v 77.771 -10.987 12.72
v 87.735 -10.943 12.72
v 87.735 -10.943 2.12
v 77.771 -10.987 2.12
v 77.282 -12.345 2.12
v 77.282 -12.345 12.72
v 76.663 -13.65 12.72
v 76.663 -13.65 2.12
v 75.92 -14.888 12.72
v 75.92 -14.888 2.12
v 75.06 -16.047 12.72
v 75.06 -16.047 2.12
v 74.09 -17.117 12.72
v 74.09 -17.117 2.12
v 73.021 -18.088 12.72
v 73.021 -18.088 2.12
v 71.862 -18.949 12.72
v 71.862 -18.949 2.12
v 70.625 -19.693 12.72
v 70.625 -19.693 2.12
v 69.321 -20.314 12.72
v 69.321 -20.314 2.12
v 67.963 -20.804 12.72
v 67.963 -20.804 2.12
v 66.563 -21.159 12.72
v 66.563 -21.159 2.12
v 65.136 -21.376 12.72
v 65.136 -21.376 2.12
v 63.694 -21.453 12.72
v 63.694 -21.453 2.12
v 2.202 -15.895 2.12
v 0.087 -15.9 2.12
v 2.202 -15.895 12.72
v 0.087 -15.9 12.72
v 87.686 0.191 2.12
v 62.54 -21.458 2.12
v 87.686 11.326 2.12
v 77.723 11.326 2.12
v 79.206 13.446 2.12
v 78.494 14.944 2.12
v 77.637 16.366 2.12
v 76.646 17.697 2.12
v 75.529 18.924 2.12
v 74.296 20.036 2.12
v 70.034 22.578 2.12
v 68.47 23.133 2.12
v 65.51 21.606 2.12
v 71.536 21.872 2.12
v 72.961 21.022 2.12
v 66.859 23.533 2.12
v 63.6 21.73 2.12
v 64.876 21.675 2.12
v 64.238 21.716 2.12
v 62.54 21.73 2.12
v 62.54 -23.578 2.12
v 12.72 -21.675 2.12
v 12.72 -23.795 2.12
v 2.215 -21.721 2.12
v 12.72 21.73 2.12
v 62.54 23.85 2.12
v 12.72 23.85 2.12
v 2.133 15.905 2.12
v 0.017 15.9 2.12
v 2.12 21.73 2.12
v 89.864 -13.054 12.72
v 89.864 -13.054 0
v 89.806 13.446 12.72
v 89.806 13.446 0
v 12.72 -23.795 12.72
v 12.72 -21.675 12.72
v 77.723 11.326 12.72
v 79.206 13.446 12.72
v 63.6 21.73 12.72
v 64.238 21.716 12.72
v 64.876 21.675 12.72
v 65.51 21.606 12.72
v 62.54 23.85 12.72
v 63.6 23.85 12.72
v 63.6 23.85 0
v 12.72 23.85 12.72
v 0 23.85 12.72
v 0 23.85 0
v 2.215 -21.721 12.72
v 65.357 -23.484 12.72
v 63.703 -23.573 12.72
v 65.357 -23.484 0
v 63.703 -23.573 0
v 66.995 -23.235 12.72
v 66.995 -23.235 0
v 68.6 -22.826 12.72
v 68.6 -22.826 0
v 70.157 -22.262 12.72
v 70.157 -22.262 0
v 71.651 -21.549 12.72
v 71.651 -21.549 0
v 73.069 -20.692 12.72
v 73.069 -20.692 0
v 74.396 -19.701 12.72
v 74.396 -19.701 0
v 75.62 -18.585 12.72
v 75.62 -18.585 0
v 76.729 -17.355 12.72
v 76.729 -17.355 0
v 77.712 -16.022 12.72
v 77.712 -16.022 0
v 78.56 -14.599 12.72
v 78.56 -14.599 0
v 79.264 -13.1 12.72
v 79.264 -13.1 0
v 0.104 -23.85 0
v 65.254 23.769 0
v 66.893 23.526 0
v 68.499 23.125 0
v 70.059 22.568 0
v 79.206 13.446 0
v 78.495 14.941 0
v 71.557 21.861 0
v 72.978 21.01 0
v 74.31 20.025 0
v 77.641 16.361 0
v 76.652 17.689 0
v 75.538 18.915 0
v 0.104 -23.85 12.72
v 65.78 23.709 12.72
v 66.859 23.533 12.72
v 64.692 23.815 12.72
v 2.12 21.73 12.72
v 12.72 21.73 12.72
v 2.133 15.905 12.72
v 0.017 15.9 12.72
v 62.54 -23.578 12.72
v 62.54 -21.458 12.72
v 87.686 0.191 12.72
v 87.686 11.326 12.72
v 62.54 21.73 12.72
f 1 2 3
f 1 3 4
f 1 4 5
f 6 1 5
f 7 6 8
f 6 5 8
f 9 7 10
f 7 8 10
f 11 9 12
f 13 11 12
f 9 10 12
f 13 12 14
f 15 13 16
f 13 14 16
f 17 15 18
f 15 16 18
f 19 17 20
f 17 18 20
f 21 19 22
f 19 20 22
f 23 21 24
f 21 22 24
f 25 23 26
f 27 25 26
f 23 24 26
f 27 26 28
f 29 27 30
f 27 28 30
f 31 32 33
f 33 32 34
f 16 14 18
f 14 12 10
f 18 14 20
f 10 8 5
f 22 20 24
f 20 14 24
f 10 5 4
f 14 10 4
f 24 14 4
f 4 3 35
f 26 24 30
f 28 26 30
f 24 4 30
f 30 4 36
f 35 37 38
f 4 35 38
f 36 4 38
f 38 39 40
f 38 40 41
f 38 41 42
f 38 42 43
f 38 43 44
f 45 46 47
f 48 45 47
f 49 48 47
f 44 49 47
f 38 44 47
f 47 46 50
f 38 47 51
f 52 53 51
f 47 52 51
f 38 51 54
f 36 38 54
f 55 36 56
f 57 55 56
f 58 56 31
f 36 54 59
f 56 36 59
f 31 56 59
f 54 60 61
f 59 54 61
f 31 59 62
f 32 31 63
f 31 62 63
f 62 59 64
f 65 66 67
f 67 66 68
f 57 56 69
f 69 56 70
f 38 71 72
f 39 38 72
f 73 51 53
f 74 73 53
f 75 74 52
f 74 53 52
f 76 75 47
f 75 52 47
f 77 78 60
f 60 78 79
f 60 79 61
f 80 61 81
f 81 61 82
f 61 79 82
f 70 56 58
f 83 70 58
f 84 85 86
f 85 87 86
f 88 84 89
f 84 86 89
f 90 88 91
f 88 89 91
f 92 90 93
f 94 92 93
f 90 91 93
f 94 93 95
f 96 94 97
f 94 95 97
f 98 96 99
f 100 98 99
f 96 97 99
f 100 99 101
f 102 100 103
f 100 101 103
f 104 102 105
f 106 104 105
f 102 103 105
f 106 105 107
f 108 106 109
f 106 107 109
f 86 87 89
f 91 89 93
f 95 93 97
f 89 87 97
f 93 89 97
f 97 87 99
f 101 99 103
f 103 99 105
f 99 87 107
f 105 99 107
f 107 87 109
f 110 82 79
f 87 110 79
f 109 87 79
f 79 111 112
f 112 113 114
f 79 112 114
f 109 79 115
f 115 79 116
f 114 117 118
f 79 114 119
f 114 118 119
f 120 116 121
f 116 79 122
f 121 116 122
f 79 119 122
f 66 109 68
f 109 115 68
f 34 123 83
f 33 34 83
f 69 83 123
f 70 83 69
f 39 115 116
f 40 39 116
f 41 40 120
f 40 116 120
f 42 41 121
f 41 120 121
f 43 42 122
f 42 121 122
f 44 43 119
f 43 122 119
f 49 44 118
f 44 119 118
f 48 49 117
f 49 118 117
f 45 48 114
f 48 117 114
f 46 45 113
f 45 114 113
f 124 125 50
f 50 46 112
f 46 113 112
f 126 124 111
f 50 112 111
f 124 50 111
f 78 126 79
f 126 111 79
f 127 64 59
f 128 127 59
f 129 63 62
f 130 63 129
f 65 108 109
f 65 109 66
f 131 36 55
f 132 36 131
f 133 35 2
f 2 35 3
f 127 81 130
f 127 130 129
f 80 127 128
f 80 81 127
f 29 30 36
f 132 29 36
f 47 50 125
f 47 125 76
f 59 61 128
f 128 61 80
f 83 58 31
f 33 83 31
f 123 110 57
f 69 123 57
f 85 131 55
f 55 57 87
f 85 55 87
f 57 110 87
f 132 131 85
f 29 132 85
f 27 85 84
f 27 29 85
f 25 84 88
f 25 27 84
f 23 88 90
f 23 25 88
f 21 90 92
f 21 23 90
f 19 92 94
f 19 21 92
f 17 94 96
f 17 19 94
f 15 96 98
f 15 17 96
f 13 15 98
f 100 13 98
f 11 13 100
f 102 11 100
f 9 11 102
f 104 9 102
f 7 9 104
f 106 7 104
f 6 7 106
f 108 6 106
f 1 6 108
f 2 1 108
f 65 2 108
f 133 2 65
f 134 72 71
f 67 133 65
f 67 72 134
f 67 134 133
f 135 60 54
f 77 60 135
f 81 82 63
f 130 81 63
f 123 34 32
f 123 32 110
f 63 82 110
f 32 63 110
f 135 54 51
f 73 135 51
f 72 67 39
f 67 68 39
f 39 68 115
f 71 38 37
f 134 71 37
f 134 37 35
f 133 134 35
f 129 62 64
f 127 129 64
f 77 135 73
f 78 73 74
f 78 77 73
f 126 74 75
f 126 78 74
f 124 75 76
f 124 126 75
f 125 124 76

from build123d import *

# Parameters (mm, degrees)
F1_DEPTH  = 2
F3_DEPTH  = 10
F4_W      = 30
F4_H      = 10
F5_DEPTH  = 1.9956371739
F4_H_2    = 50
F6_DEPTH  = 25
F8_DEPTH  = 50
F9_W      = 47
F9_H      = 10
F10_DEPTH = 45.0007863305
F11_SCALE = 1.06


with BuildPart() as f1:
    # F0 (on Top) → F1 (new body)
    with BuildSketch(Plane.XY):
        with BuildLine():
            Line((60, 22.5), (0, 22.5))
            Line((0, 22.5), (0.09805652, -22.4997863305))
            Line((0.09805652, -22.4997863305), (60.0974867347, -22.2383022772))
            ThreePointArc((60.0974867347, -22.2383022772), (68.9331965187, -19.52097203), (74.7776478239, -12.3588466471))
            Line((74.7776478239, -12.3588466471), (84.7775528597, -12.3152659716))
            Line((84.7775528597, -12.3152659716), (84.7230770152, 12.6846153232))
            Line((84.7230770152, 12.6846153232), (74.7230770152, 12.6846153232))
            ThreePointArc((74.7230770152, 12.6846153232), (68.8474681852, 19.8212021779), (60, 22.5))
        make_face()
    extrude(amount=F1_DEPTH)

    # F2 (on face) → F3 (join)
    with BuildSketch(Plane.XY.offset(2)):
        with BuildLine():
            Line((0.09805652, -22.4997863305), (60.0974867347, -22.2383022772))
            ThreePointArc((60.0974867347, -22.2383022772), (68.9331965187, -19.52097203), (74.7776478239, -12.3588466471))
            Line((74.7776478239, -12.3588466471), (84.7775528597, -12.3152659716))
            Line((84.7775528597, -12.3152659716), (84.7230770152, 12.6846153232))
            Line((84.7230770152, 12.6846153232), (74.7230770152, 12.6846153232))
            ThreePointArc((74.7230770152, 12.6846153232), (68.8474681852, 19.8212021779), (60, 22.5))
            Line((60, 22.5), (0, 22.5))
            Line((0, 22.5), (0.09805652, -22.4997863305))
        make_face()
        with BuildLine():
            Line((2, 20.5), (60, 20.5))
            ThreePointArc((60, 20.5), (68.2741953452, 17.7812150693), (73.3231924886, 10.6846153232))
            Line((73.3231924886, 10.6846153232), (82.7230770152, 10.6846153232))
            Line((82.7230770152, 10.6846153232), (82.7230770152, 0.1802572349))
            Line((82.7230770152, 0.1802572349), (82.7688557174, -10.3240010995))
            Line((82.7688557174, -10.3240010995), (73.3690604561, -10.3649664313))
            ThreePointArc((73.3690604561, -10.3649664313), (68.3510387212, -17.4835026557), (60.0887705996, -20.23832127))
            Line((60.0887705996, -20.23832127), (2.0893213921, -20.4910891882))
            Line((2.0893213921, -20.4910891882), (2, 20.5))
        make_face(mode=Mode.SUBTRACT)
    extrude(amount=F3_DEPTH)

    # F4 (on face) → F5 (cut, through all)
    with BuildSketch(Plane(origin=(0.04902826, 0.0001068347, 0), x_dir=(0.002179039, -0.9999976259, 0), z_dir=(-0.9999976259, -0.002179039, 0))):
        with Locations((0, 7)):
            Rectangle(F4_W, F4_H)
    extrude(amount=-F5_DEPTH, mode=Mode.SUBTRACT)

    # F4 (on face) → F6 (cut)
    with BuildSketch(Plane(origin=(0.04902826, 0.0001068347, 0), x_dir=(0.002179039, -0.9999976259, 0), z_dir=(-0.9999976259, -0.002179039, 0))):
        with Locations((0, 27)):
            Rectangle(F4_W, F4_H_2)
    extrude(amount=-F6_DEPTH, mode=Mode.SUBTRACT)

    # F7 (on face) → F8 (cut)
    with BuildSketch(Plane.XY.offset(2)):
        Polygon((56.9224528048, 13.4114075262), (69.6910599869, 5.4954265969), (86.4650020105, 29.460177553), (73.6963948284, 37.3761584823), align=None)
    extrude(amount=F8_DEPTH, mode=Mode.SUBTRACT)

    # F9 (on face) → F10 (cut, through all)
    with BuildSketch(Plane(origin=(0, 22.5, 0), x_dir=(-1, 0, 0), z_dir=(0, 1, 0))):
        with Locations((-35.5, 7)):
            Rectangle(F9_W, F9_H)
    extrude(amount=-F10_DEPTH, mode=Mode.SUBTRACT)


with BuildPart() as f1_1:
    # F11: moved
    add(f1.part.scale(F11_SCALE))


solid = f1_1.part
